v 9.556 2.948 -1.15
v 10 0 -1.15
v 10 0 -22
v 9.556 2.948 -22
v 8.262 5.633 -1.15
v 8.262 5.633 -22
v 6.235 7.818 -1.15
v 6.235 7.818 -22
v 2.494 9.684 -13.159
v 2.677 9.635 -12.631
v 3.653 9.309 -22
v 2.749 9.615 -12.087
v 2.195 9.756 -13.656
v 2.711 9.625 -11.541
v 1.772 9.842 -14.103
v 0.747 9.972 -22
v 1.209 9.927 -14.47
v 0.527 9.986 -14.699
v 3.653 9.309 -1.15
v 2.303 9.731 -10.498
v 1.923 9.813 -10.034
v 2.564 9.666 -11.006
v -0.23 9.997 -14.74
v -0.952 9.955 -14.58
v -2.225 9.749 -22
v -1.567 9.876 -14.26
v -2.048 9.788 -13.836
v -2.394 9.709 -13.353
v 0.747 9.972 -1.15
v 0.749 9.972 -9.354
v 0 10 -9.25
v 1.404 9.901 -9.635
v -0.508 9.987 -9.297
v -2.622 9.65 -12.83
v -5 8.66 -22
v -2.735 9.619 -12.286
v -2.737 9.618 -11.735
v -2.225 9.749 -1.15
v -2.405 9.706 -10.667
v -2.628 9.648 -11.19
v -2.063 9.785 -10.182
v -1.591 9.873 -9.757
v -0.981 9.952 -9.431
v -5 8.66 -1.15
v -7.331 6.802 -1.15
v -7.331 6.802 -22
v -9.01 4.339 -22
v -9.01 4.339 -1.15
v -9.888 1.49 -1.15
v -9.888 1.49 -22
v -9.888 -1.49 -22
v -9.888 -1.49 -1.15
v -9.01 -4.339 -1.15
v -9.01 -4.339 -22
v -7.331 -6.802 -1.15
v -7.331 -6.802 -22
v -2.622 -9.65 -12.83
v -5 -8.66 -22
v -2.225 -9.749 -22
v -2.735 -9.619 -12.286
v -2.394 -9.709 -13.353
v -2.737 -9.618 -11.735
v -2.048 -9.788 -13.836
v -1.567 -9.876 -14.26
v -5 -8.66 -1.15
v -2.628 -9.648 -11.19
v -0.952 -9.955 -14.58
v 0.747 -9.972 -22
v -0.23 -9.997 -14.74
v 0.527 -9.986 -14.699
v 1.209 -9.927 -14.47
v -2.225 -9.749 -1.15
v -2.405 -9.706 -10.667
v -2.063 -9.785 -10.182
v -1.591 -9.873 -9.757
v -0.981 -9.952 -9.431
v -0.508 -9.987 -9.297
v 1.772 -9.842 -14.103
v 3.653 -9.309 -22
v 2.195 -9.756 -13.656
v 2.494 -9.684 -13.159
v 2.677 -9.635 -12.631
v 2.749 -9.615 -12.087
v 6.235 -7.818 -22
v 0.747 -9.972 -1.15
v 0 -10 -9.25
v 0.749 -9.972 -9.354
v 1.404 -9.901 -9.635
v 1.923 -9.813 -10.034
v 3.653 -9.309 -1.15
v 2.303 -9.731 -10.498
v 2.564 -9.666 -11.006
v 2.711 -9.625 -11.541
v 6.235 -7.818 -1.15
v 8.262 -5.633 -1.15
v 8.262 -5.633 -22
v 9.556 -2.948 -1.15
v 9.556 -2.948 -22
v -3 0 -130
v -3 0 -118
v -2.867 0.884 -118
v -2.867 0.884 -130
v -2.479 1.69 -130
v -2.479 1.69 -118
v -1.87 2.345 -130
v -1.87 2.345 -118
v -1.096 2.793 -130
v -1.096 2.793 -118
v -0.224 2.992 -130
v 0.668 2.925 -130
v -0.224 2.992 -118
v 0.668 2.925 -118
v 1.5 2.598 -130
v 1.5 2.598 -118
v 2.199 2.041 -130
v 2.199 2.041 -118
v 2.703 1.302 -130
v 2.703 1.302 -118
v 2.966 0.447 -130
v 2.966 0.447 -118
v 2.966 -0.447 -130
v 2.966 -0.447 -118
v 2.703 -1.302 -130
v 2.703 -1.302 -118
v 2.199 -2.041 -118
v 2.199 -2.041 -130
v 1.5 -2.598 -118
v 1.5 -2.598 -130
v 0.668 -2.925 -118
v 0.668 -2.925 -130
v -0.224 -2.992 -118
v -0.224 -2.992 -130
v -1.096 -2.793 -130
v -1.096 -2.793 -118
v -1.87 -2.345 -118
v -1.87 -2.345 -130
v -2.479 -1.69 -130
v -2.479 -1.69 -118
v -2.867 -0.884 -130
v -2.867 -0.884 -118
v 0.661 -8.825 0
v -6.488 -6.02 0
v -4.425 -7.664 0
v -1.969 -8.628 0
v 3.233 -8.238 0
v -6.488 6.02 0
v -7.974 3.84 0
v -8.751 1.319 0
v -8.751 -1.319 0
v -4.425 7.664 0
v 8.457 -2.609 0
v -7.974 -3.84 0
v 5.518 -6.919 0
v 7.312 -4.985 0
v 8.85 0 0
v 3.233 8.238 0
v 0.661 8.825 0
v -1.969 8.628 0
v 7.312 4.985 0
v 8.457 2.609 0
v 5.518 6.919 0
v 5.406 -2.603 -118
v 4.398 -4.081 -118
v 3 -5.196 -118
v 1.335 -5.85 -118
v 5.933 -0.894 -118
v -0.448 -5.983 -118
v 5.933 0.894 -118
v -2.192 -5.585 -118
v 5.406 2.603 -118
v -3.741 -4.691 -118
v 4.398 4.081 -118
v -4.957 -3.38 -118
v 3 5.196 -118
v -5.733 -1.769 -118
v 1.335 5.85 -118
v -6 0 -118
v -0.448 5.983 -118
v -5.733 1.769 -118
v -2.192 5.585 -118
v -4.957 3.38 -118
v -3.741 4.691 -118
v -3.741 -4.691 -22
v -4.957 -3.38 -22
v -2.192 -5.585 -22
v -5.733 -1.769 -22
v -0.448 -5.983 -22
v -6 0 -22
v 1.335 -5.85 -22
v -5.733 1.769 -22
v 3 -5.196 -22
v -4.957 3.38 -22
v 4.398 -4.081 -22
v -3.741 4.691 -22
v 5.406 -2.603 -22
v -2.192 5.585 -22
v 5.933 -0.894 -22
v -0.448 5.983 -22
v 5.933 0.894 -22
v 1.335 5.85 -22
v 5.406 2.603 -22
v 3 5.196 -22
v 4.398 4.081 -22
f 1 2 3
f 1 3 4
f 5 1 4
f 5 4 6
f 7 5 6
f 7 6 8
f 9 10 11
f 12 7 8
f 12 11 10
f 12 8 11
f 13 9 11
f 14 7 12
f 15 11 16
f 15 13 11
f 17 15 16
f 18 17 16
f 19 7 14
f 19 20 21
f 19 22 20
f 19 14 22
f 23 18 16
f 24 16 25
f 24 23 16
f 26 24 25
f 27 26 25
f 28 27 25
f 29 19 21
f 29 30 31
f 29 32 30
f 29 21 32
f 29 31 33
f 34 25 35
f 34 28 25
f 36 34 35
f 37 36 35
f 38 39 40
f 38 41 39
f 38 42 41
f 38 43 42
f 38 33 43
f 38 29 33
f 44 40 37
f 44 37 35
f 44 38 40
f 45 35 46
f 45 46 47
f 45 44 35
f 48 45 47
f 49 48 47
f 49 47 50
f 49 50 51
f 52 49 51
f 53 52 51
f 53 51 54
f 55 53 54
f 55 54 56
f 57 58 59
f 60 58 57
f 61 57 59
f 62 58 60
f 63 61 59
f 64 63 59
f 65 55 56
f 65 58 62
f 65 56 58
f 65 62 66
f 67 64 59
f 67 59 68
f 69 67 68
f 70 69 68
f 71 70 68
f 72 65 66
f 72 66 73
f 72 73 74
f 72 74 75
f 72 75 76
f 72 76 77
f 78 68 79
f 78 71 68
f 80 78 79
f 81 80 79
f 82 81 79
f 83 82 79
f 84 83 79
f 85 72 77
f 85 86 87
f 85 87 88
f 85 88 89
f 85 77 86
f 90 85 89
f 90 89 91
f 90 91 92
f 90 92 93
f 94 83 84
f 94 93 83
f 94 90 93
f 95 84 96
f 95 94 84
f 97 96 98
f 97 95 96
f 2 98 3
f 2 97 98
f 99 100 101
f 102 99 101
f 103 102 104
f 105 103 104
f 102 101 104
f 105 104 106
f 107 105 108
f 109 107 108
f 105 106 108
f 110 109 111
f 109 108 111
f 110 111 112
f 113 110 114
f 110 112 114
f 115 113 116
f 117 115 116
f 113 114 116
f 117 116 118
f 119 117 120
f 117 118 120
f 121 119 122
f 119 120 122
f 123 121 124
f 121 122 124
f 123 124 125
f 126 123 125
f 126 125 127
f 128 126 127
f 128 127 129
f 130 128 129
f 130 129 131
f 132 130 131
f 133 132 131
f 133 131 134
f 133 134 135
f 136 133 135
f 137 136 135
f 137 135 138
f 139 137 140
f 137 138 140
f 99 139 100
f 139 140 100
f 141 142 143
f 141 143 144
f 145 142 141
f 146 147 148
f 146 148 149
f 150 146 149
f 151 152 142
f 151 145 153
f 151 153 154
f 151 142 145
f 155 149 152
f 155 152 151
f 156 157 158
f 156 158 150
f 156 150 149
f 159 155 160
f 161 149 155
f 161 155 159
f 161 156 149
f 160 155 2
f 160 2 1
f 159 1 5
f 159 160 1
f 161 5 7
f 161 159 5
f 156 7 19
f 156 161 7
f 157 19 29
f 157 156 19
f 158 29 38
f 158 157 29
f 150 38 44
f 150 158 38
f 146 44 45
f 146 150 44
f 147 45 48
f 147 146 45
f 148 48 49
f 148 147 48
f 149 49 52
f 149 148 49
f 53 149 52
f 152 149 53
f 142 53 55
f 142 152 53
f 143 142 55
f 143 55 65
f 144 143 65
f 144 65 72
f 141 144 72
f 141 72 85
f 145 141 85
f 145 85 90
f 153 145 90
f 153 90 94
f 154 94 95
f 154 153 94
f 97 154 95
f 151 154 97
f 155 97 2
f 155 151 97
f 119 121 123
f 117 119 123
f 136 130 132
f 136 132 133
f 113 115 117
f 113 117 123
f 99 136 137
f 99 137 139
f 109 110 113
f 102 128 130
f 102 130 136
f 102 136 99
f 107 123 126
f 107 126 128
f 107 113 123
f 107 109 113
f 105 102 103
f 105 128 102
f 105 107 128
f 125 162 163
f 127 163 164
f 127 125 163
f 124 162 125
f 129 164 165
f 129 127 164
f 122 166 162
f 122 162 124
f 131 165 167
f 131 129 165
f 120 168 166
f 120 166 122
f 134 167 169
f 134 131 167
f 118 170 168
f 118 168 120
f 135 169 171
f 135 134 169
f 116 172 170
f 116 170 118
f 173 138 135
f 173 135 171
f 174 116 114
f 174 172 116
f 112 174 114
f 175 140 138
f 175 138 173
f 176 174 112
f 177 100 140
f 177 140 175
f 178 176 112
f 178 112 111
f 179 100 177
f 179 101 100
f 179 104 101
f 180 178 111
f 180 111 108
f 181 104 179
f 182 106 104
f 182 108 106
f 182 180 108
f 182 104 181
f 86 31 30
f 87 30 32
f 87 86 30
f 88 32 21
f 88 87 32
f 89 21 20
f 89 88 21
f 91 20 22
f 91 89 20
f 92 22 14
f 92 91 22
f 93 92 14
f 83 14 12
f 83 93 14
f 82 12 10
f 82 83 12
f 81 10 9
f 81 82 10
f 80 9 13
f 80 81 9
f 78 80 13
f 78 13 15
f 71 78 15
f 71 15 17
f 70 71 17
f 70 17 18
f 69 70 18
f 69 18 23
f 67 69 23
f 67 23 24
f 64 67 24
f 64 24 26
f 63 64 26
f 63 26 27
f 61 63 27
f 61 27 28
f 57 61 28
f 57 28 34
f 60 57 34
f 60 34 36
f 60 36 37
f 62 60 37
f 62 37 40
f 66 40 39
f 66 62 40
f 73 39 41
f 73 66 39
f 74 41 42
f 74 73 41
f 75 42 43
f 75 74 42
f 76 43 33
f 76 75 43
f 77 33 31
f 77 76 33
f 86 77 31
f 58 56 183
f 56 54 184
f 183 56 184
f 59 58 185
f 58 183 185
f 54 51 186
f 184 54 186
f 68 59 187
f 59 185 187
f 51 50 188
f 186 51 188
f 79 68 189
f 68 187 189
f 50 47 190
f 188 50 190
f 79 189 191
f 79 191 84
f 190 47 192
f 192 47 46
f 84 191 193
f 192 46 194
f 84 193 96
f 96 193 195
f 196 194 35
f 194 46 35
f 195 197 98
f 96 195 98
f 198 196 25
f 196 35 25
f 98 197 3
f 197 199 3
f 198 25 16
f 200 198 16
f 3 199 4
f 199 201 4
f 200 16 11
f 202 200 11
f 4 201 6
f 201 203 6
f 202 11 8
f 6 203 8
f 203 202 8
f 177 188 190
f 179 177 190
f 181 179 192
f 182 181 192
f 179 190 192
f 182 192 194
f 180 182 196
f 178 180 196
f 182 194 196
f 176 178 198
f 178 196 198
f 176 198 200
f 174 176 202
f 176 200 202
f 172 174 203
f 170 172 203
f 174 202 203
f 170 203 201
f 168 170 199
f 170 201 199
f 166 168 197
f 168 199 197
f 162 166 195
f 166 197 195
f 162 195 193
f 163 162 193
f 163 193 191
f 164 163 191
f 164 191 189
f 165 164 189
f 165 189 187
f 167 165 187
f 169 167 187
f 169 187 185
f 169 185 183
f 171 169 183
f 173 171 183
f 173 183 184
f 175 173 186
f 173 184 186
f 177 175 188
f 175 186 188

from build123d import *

# Parameters (mm, degrees)
SKETCH3_R               = 10
BOSS_EXTRUDE1_DEPTH     = 22
SKETCH4_R               = 6
BOSS_EXTRUDE2_DEPTH     = 96
SKETCH5_R               = 3
BOSS_EXTRUDE3_DEPTH     = 12
CUT_EXTRUDE2_DEPTH      = 131.766968306
CUT_EXTRUDE2_DEPTH_BACK = 131.766968306
SKETCH6_R               = 2.75
CHAMFER1_SIZE           = 1.15


with BuildPart() as part:
    # Sketch3 → Boss-Extrude1 (new body)
    with BuildSketch(Plane.XY):
        Circle(SKETCH3_R)
    extrude(amount=-BOSS_EXTRUDE1_DEPTH)

    # Sketch4 → Boss-Extrude2 (add)
    with BuildSketch(Plane(origin=(0, 0, -22), x_dir=(-1, 0, 0), z_dir=(0, 0, -1))):
        Circle(SKETCH4_R)
    extrude(amount=BOSS_EXTRUDE2_DEPTH)

    # Sketch5 → Boss-Extrude3 (add)
    with BuildSketch(Plane(origin=(0, 0, -118), x_dir=(-1, 0, 0), z_dir=(0, 0, -1))):
        Circle(SKETCH5_R)
    extrude(amount=BOSS_EXTRUDE3_DEPTH)

    # Sketch6 → Cut-Extrude2 (cut, two sides: drawn at the far end of the back side and taken through both)
    with BuildSketch(Plane(origin=(0, 0, 0), x_dir=(1, 0, 0), z_dir=(0, 1, 0)).offset(-CUT_EXTRUDE2_DEPTH_BACK)):
        with Locations(Location((0, 12, 0), (0, 0, 270))):
            Circle(SKETCH6_R)
    extrude(amount=CUT_EXTRUDE2_DEPTH + CUT_EXTRUDE2_DEPTH_BACK, mode=Mode.SUBTRACT)

    # Chamfer1
    chamfer1_edges = [part.edges().sort_by_distance(p)[0] for p in [
        (-10, 0, 0),
    ]]
    chamfer(chamfer1_edges, length=CHAMFER1_SIZE)


solid = part.part
